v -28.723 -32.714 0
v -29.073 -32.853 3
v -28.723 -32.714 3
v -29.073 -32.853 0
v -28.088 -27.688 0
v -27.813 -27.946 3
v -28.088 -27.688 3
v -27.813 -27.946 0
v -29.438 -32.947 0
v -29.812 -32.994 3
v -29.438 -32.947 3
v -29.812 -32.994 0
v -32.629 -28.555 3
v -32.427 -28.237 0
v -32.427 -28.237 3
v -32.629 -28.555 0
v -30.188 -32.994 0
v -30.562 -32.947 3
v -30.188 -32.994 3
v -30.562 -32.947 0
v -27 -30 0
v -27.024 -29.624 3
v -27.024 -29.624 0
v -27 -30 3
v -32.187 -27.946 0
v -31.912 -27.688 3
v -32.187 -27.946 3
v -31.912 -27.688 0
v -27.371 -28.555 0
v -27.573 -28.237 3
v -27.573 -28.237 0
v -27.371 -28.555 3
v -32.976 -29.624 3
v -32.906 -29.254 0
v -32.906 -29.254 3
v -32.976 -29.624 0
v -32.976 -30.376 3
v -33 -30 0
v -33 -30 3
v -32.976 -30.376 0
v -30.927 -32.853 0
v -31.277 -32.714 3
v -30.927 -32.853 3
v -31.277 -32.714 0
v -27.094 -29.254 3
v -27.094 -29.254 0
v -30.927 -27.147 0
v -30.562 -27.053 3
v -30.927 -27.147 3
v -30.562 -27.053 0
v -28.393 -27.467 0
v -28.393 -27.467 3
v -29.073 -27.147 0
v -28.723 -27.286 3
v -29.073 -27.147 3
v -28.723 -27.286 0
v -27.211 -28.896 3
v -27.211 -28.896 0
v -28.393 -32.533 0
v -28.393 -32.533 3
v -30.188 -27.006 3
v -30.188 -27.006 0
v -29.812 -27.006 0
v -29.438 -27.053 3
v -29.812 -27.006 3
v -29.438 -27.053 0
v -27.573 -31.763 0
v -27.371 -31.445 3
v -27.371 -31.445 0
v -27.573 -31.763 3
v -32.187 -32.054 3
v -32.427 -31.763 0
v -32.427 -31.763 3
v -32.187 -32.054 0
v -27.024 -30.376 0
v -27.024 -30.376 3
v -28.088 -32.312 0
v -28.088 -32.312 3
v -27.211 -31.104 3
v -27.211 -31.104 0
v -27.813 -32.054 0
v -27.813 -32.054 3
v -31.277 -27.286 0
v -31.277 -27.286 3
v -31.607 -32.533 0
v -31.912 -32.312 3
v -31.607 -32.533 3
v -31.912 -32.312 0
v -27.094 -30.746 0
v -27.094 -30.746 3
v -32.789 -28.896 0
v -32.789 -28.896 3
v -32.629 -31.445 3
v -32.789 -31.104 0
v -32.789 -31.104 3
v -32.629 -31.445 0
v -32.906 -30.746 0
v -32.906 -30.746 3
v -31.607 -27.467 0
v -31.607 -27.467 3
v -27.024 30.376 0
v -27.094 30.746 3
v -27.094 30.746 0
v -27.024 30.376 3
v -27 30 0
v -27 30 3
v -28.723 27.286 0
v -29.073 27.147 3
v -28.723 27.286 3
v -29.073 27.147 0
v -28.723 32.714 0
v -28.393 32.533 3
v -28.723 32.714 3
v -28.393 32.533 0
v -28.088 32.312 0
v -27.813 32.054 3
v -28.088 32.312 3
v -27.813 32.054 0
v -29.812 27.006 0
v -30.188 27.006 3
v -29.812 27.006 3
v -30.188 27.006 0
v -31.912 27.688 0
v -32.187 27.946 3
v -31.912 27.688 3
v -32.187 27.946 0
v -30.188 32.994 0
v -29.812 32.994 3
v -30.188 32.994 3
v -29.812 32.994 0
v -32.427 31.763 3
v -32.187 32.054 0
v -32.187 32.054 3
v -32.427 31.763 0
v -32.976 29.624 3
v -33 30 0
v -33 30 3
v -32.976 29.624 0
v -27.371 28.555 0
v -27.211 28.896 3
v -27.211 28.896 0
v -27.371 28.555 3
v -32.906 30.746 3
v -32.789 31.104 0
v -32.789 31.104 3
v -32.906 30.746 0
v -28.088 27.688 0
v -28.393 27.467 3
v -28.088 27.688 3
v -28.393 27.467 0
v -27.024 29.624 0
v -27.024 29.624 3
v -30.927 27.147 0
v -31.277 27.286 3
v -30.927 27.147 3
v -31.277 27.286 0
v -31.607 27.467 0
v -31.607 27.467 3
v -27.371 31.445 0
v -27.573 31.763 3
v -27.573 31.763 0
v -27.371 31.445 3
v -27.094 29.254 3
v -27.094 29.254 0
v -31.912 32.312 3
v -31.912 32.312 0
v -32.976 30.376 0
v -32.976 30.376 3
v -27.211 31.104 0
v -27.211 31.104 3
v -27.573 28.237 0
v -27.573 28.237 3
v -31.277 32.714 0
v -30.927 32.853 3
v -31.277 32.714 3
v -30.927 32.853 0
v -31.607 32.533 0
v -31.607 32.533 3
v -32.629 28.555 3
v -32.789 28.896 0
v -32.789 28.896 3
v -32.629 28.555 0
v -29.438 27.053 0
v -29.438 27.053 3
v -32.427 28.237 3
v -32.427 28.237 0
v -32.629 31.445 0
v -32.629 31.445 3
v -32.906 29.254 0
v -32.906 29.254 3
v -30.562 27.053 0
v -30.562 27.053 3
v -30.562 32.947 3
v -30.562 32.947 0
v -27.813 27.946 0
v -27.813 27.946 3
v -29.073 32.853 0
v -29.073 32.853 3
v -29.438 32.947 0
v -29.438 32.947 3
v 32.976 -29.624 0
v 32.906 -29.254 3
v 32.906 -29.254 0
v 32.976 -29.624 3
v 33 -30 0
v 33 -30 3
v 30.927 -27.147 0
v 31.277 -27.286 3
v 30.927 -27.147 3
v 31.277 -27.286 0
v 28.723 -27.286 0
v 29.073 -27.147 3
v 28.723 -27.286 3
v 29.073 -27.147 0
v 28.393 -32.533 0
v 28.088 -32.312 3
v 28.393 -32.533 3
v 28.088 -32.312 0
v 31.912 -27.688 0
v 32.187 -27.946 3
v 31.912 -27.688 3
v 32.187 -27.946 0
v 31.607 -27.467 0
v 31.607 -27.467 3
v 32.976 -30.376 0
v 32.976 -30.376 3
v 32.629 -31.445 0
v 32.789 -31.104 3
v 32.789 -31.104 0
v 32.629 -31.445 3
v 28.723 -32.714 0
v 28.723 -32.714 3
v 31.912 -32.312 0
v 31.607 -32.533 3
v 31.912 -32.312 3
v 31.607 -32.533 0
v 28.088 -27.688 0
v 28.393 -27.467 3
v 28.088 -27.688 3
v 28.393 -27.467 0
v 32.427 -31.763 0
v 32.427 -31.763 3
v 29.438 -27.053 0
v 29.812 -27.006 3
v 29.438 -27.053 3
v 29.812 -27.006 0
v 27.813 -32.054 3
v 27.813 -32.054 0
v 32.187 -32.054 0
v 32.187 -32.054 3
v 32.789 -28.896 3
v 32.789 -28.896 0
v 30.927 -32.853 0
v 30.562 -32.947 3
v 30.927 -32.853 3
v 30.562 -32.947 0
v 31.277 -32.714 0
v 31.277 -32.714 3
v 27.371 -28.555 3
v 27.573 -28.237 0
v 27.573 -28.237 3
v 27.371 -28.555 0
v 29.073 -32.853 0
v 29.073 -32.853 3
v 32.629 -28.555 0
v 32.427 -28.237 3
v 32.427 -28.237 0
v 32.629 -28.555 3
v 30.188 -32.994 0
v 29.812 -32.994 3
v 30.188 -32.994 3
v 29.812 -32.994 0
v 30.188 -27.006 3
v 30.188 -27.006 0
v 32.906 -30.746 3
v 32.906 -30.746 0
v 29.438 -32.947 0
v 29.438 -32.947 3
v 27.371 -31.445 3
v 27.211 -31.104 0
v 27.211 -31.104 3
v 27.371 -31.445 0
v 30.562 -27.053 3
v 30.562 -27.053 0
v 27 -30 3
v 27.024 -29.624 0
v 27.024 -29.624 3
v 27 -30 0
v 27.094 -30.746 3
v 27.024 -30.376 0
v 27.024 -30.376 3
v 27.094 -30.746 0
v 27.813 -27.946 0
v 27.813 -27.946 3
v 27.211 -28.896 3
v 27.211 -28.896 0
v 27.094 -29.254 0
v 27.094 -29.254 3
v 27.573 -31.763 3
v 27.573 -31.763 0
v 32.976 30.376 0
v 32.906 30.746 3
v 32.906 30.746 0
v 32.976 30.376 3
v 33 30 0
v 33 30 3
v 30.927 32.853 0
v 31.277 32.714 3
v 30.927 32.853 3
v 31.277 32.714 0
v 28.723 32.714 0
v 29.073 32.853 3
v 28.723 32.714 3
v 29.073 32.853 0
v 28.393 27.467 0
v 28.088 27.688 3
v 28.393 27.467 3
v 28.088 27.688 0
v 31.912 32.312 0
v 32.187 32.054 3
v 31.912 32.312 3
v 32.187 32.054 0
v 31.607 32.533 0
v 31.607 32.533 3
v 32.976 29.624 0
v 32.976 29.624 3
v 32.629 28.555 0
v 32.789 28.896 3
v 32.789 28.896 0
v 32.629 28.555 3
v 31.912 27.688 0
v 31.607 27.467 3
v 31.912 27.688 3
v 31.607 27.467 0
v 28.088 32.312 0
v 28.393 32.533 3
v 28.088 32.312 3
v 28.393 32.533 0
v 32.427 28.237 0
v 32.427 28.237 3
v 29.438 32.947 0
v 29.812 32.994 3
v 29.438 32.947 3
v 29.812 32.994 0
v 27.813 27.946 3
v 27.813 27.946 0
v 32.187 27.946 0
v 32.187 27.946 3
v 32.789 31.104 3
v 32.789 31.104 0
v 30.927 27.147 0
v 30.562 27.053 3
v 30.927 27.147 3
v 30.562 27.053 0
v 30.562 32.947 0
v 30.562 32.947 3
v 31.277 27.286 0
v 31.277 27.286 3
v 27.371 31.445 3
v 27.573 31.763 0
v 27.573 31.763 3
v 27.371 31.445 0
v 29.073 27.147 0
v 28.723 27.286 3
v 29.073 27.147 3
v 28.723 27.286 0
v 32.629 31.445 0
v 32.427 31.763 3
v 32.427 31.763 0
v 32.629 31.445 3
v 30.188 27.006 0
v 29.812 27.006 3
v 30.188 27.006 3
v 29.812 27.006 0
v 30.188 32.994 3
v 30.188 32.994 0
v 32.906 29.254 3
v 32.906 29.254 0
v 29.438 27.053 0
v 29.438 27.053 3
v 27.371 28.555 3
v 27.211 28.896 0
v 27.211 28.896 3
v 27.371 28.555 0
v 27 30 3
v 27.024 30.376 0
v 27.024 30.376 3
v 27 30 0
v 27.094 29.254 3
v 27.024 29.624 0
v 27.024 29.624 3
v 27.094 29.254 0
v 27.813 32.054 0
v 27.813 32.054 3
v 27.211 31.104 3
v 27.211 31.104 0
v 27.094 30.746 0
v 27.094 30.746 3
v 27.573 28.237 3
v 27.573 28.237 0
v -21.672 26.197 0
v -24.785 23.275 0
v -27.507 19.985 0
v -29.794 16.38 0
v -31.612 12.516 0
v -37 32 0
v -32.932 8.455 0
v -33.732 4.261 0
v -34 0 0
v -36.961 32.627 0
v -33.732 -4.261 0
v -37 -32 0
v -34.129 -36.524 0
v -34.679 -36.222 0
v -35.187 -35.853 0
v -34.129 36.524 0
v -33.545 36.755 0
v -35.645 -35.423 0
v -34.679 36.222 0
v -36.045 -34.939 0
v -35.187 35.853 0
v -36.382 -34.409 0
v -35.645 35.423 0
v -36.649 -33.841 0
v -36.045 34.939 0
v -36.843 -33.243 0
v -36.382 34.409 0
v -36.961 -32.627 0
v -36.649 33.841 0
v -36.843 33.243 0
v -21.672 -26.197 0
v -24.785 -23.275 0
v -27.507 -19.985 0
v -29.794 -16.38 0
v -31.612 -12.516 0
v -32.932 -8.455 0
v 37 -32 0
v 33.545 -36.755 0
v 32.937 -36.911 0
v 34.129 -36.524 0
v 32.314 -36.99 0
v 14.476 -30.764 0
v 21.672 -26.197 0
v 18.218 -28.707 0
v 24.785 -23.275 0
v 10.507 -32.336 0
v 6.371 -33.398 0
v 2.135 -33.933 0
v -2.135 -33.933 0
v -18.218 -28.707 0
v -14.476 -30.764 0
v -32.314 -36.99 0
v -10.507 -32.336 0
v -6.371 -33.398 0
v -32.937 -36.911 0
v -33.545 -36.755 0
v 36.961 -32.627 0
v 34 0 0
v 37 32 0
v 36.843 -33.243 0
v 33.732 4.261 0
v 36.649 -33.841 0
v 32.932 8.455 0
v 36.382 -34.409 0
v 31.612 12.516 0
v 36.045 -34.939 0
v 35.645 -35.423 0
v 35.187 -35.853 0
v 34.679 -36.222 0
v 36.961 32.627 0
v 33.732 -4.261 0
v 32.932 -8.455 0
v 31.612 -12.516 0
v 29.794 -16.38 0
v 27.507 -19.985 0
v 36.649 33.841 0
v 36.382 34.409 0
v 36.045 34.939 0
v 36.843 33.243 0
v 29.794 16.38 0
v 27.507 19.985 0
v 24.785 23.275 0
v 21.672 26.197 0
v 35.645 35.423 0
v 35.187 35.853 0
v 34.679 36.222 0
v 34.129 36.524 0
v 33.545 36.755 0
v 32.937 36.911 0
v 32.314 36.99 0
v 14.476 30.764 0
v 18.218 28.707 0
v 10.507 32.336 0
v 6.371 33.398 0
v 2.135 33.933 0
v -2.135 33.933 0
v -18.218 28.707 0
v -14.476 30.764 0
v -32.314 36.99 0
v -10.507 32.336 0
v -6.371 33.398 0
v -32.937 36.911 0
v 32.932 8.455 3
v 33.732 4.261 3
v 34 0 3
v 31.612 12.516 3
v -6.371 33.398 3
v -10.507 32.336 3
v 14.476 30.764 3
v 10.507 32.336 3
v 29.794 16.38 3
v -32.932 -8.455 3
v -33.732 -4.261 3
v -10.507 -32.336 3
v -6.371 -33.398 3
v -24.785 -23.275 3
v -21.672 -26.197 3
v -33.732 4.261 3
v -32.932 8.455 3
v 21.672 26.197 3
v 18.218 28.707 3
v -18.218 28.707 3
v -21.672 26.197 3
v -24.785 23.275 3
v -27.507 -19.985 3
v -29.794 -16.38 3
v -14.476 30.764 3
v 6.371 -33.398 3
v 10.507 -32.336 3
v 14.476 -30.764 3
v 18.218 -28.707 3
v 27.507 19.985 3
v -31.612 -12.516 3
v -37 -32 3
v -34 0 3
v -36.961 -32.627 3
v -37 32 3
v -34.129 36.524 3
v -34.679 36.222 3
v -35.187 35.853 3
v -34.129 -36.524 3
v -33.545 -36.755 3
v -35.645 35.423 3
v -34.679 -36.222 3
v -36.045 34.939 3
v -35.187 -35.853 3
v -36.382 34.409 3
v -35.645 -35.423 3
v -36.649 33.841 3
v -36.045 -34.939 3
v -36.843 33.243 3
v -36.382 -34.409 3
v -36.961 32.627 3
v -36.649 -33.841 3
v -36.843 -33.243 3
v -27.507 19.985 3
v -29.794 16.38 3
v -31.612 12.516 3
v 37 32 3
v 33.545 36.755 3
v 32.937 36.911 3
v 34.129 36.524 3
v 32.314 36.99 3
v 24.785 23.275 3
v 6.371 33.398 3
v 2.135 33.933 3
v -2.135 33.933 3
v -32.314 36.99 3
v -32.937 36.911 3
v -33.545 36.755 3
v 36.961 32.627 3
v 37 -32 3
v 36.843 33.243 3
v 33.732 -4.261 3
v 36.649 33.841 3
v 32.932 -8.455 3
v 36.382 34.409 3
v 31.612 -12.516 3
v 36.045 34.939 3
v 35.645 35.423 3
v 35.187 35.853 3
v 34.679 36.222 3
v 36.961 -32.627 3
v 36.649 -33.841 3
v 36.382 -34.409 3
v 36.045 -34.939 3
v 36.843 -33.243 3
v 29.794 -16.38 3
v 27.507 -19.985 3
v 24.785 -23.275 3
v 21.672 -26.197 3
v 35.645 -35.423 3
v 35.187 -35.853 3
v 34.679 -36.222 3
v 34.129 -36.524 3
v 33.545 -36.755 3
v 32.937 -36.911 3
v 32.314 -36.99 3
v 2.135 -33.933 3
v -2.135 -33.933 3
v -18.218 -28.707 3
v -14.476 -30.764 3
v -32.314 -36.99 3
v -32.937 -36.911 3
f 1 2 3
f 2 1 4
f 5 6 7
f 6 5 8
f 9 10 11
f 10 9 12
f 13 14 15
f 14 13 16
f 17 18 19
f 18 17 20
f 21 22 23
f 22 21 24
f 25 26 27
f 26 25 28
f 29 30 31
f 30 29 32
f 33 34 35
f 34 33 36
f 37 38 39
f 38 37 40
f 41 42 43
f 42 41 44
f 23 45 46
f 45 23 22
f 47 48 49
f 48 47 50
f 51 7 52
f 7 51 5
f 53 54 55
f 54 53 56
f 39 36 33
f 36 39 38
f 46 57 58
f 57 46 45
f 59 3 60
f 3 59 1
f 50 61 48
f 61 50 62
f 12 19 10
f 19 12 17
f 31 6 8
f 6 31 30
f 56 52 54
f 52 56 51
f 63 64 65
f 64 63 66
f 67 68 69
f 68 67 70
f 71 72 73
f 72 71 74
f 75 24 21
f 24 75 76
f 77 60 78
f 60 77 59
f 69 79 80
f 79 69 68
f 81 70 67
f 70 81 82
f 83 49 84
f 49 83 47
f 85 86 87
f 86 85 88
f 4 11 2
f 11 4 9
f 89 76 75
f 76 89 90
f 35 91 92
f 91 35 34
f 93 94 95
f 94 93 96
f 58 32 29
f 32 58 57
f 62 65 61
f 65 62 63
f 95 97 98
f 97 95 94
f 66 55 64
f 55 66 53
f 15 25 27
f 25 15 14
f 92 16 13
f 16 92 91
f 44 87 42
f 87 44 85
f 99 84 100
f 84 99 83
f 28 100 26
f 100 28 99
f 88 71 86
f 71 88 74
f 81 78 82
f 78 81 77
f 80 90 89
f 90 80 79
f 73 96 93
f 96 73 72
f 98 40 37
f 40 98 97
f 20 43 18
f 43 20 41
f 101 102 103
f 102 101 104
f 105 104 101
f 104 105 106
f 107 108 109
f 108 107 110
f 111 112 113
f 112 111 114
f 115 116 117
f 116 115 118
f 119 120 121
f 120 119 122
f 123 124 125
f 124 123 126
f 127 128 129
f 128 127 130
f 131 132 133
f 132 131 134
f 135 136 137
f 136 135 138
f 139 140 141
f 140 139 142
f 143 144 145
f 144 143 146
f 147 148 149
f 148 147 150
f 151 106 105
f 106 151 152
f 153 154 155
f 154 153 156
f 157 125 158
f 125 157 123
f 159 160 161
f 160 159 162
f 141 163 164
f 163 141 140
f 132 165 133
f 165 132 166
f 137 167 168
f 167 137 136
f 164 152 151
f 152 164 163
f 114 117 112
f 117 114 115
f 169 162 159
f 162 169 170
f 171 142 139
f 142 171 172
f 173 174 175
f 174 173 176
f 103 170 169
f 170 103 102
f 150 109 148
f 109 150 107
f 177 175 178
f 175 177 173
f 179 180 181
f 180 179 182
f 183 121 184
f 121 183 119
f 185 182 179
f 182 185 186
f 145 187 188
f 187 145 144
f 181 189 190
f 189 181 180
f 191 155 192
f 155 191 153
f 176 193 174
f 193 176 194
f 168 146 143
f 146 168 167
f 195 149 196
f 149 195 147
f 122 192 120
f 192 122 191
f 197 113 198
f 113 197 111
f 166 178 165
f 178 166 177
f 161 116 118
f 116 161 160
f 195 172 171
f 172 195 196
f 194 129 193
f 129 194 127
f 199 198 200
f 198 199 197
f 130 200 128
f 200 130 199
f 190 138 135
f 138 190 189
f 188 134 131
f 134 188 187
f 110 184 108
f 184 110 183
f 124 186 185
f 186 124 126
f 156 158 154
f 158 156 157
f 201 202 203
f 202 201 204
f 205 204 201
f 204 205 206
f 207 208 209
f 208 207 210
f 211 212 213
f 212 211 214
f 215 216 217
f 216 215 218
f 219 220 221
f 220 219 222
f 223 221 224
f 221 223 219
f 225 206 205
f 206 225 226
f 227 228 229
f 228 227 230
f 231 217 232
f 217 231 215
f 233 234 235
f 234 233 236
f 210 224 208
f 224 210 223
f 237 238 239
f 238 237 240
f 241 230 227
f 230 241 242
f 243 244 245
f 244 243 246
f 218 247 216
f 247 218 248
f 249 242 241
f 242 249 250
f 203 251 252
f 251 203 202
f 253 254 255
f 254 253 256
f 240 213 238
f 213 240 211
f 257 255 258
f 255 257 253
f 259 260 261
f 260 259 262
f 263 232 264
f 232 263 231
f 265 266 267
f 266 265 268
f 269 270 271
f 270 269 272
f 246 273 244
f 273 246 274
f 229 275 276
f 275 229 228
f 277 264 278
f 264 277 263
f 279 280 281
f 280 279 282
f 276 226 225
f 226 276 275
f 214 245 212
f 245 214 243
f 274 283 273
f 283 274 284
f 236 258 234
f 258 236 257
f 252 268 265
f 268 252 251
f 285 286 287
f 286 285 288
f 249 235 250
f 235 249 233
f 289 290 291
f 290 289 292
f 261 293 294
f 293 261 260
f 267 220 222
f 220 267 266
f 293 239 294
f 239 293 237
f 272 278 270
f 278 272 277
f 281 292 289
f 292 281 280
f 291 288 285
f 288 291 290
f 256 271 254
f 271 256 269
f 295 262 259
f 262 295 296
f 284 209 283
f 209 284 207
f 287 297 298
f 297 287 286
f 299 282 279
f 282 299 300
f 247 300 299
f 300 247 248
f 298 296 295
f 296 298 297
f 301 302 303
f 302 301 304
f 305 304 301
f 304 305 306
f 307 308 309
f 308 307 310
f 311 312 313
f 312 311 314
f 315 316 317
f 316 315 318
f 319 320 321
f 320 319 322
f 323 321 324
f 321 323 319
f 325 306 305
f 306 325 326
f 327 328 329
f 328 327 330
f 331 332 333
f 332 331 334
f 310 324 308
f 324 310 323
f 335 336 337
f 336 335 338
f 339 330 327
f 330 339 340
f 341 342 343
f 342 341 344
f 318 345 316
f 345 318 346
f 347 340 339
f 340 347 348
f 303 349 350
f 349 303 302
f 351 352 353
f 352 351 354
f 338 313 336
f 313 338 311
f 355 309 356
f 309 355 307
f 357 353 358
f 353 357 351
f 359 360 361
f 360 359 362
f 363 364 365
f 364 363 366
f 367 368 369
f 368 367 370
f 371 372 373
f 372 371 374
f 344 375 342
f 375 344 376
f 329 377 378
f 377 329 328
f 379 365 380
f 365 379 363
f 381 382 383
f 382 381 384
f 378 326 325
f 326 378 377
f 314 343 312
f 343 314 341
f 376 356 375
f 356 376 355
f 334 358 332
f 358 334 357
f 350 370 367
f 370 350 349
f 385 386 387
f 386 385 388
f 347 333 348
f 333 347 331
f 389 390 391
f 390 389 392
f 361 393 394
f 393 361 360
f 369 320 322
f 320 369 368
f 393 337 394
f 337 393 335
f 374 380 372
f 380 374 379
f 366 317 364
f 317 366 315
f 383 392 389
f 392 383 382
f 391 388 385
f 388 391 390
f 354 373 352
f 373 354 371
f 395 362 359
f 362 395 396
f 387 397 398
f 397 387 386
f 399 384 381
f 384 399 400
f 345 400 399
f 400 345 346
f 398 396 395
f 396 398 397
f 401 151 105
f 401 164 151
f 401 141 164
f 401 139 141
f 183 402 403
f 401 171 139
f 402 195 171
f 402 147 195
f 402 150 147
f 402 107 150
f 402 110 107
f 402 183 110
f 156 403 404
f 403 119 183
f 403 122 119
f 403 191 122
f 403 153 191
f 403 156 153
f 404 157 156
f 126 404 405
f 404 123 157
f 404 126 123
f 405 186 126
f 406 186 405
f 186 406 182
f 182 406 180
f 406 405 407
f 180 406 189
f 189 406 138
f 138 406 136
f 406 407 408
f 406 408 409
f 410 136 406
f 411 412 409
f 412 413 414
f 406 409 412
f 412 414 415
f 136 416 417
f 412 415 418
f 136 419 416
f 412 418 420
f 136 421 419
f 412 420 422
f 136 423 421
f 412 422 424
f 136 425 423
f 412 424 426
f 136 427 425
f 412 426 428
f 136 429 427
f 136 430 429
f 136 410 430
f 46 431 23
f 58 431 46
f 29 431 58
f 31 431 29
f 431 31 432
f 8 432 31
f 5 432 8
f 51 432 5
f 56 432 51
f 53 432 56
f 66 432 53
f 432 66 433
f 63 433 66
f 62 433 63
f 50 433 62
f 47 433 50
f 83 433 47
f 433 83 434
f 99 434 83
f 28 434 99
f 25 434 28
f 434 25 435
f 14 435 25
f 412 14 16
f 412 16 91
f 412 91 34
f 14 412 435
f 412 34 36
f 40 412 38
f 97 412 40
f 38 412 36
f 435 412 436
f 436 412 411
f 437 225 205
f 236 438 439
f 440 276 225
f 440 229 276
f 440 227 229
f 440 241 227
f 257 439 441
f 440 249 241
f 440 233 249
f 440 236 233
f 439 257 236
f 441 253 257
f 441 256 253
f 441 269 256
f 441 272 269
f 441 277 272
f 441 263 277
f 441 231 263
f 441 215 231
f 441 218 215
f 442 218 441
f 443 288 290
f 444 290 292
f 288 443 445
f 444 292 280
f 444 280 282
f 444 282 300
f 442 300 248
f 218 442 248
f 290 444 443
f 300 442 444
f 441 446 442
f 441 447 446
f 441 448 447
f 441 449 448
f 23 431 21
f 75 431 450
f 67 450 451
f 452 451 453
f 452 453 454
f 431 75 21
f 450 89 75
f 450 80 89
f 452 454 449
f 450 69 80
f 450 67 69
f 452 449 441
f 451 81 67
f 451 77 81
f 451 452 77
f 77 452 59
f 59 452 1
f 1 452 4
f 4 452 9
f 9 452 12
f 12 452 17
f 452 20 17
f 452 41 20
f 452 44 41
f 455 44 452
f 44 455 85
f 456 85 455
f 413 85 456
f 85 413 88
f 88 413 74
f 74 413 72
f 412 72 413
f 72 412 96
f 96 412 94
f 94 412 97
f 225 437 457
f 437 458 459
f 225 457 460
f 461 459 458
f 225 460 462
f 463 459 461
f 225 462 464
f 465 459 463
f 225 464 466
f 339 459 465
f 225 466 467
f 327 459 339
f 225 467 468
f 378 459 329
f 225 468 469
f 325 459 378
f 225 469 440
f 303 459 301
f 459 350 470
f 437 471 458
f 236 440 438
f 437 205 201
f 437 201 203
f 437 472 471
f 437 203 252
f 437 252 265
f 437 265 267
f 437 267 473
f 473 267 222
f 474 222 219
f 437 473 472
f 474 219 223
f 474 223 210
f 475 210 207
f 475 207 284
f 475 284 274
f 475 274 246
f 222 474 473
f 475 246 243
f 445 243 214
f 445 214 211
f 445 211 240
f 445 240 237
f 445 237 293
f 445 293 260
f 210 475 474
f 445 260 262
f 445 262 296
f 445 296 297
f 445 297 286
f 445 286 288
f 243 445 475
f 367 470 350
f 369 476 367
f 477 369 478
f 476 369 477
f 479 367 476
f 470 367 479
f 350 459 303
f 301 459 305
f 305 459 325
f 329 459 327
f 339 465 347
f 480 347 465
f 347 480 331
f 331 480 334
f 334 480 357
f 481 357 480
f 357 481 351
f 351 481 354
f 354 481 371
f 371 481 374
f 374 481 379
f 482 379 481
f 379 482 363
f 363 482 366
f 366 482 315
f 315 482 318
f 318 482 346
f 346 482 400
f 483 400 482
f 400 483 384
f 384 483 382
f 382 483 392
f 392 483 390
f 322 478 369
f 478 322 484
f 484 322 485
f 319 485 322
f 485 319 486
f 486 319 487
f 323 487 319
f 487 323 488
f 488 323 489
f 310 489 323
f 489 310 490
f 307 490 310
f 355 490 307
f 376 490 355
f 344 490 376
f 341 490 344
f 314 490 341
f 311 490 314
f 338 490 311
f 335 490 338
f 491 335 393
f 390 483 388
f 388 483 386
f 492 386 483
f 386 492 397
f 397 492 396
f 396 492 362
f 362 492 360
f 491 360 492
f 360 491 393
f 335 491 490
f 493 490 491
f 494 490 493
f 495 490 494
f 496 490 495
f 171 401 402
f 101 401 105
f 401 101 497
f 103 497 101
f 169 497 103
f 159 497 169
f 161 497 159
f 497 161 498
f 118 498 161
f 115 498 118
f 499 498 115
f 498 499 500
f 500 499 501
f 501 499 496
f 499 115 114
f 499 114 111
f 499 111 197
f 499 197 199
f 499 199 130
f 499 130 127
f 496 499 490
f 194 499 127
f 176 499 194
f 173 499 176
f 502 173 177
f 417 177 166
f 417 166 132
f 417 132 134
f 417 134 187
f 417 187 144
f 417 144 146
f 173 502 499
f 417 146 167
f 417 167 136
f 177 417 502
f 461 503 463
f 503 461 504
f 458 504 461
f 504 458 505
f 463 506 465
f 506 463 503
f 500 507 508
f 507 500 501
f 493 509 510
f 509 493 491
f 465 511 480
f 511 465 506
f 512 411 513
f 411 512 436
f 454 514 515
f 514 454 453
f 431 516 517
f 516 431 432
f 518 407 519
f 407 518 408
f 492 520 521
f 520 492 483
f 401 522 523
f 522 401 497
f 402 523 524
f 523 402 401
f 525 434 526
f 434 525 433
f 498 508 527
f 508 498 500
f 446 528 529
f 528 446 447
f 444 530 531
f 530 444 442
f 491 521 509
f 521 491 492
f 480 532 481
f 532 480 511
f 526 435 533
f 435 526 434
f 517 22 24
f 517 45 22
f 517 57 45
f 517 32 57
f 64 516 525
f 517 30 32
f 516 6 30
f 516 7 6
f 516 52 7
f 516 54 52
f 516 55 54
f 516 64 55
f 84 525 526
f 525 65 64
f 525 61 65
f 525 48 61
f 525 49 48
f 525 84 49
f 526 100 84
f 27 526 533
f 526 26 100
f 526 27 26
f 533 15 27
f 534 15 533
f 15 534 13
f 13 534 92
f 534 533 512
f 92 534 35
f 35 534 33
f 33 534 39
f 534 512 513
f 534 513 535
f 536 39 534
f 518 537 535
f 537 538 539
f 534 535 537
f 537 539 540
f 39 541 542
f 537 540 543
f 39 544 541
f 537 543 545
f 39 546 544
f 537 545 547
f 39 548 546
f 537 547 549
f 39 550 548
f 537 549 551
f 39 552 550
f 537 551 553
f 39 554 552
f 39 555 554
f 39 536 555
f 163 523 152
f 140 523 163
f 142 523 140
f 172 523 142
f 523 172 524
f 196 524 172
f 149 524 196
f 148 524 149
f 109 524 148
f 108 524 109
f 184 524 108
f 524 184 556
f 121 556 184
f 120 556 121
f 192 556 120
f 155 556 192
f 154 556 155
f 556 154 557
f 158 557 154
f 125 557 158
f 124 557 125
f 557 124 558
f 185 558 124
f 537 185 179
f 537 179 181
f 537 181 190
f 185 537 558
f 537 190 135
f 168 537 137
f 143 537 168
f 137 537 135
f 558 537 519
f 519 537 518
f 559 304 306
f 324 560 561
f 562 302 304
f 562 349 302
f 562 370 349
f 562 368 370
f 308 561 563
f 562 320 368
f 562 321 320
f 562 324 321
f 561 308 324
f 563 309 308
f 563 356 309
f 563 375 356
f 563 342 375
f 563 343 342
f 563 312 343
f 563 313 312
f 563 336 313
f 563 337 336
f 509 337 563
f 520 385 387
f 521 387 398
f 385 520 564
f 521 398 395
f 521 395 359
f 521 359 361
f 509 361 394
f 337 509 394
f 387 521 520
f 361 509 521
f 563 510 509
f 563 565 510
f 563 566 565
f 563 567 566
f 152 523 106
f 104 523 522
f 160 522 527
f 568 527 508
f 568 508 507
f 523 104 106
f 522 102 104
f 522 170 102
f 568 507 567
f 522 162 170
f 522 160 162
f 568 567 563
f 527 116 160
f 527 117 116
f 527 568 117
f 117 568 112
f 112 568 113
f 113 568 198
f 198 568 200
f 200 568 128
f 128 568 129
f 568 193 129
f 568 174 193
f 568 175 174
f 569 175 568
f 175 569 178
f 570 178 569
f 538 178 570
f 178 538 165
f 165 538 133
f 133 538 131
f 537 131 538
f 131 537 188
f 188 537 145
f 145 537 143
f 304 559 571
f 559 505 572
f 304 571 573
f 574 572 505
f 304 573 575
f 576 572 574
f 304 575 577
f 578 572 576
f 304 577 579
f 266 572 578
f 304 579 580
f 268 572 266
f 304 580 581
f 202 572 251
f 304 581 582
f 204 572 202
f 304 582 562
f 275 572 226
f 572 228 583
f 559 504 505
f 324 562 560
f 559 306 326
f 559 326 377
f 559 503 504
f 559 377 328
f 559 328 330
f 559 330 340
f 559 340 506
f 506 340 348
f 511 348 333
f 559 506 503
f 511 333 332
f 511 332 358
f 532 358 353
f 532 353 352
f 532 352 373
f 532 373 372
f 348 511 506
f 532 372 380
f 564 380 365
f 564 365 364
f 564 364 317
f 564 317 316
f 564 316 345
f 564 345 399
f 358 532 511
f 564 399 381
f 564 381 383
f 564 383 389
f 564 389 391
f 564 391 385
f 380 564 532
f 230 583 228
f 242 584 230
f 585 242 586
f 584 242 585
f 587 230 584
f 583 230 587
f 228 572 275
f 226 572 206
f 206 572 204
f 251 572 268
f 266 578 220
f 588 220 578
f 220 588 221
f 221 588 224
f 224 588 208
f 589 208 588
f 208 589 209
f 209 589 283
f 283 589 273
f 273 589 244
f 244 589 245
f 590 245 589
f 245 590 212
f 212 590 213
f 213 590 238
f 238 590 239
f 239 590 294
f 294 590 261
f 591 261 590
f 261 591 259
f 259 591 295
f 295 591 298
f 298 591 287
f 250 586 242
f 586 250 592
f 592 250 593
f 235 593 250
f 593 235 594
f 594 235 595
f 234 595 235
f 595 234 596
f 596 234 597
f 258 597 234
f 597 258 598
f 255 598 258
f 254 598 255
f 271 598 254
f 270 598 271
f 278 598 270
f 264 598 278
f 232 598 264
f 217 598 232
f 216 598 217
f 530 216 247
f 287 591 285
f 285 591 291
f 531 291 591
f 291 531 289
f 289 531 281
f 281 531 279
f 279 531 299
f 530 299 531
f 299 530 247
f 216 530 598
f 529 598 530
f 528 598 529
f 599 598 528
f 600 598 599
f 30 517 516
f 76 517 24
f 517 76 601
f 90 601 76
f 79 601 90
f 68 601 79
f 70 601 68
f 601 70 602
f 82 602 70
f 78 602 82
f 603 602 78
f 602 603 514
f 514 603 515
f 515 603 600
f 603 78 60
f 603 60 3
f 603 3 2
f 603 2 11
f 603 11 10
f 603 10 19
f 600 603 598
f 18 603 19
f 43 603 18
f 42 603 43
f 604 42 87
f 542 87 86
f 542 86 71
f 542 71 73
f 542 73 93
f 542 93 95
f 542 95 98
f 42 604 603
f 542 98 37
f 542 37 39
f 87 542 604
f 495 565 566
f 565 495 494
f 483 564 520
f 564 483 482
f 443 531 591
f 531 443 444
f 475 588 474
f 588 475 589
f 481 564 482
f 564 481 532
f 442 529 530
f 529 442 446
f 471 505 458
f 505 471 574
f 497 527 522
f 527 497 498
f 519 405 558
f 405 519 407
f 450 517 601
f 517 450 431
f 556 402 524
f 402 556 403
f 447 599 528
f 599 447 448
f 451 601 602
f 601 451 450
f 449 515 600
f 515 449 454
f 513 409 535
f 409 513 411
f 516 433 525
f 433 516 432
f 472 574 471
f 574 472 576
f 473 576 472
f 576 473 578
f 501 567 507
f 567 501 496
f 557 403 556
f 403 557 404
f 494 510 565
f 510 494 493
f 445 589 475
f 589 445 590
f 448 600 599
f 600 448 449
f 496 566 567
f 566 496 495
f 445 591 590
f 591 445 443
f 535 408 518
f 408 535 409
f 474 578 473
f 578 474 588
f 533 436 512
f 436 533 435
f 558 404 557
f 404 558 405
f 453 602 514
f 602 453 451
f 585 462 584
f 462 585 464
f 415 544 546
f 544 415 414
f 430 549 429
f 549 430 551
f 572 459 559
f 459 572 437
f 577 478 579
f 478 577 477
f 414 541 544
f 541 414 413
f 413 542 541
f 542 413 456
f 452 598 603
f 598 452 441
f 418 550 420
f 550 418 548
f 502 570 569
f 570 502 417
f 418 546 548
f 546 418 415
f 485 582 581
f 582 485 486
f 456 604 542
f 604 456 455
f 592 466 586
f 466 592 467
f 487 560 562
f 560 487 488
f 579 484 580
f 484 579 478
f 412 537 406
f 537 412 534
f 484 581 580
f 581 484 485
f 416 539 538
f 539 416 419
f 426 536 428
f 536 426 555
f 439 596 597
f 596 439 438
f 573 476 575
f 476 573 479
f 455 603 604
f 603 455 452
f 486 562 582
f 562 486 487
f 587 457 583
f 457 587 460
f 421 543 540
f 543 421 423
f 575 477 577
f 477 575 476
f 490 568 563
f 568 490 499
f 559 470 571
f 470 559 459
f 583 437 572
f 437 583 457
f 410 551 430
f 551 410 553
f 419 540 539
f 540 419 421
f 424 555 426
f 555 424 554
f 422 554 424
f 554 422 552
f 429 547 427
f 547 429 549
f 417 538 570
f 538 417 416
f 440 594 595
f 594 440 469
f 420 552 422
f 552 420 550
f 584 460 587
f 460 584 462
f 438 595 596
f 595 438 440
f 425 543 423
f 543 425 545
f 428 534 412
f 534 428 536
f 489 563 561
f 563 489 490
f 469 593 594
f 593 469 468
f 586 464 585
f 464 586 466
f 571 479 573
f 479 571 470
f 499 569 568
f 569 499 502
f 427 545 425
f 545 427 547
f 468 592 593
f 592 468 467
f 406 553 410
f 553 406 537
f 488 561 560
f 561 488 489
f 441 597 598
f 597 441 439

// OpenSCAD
$fn = 50;


difference() {
	union() {
		hull() {
			translate(v = [-32.0000000000, 32.0000000000, 0]) {
				cylinder(h = 3, r = 5);
			}
			translate(v = [32.0000000000, 32.0000000000, 0]) {
				cylinder(h = 3, r = 5);
			}
			translate(v = [-32.0000000000, -32.0000000000, 0]) {
				cylinder(h = 3, r = 5);
			}
			translate(v = [32.0000000000, -32.0000000000, 0]) {
				cylinder(h = 3, r = 5);
			}
		}
	}
	union() {
		#translate(v = [-30.0000000000, -30.0000000000, -100.0000000000]) {
			cylinder(h = 200, r = 3.0000000000);
		}
		#translate(v = [-30.0000000000, 30.0000000000, -100.0000000000]) {
			cylinder(h = 200, r = 3.0000000000);
		}
		#translate(v = [30.0000000000, -30.0000000000, -100.0000000000]) {
			cylinder(h = 200, r = 3.0000000000);
		}
		#translate(v = [30.0000000000, 30.0000000000, -100.0000000000]) {
			cylinder(h = 200, r = 3.0000000000);
		}
		#cylinder(h = 3, r = 34.0000000000);
	}
}
